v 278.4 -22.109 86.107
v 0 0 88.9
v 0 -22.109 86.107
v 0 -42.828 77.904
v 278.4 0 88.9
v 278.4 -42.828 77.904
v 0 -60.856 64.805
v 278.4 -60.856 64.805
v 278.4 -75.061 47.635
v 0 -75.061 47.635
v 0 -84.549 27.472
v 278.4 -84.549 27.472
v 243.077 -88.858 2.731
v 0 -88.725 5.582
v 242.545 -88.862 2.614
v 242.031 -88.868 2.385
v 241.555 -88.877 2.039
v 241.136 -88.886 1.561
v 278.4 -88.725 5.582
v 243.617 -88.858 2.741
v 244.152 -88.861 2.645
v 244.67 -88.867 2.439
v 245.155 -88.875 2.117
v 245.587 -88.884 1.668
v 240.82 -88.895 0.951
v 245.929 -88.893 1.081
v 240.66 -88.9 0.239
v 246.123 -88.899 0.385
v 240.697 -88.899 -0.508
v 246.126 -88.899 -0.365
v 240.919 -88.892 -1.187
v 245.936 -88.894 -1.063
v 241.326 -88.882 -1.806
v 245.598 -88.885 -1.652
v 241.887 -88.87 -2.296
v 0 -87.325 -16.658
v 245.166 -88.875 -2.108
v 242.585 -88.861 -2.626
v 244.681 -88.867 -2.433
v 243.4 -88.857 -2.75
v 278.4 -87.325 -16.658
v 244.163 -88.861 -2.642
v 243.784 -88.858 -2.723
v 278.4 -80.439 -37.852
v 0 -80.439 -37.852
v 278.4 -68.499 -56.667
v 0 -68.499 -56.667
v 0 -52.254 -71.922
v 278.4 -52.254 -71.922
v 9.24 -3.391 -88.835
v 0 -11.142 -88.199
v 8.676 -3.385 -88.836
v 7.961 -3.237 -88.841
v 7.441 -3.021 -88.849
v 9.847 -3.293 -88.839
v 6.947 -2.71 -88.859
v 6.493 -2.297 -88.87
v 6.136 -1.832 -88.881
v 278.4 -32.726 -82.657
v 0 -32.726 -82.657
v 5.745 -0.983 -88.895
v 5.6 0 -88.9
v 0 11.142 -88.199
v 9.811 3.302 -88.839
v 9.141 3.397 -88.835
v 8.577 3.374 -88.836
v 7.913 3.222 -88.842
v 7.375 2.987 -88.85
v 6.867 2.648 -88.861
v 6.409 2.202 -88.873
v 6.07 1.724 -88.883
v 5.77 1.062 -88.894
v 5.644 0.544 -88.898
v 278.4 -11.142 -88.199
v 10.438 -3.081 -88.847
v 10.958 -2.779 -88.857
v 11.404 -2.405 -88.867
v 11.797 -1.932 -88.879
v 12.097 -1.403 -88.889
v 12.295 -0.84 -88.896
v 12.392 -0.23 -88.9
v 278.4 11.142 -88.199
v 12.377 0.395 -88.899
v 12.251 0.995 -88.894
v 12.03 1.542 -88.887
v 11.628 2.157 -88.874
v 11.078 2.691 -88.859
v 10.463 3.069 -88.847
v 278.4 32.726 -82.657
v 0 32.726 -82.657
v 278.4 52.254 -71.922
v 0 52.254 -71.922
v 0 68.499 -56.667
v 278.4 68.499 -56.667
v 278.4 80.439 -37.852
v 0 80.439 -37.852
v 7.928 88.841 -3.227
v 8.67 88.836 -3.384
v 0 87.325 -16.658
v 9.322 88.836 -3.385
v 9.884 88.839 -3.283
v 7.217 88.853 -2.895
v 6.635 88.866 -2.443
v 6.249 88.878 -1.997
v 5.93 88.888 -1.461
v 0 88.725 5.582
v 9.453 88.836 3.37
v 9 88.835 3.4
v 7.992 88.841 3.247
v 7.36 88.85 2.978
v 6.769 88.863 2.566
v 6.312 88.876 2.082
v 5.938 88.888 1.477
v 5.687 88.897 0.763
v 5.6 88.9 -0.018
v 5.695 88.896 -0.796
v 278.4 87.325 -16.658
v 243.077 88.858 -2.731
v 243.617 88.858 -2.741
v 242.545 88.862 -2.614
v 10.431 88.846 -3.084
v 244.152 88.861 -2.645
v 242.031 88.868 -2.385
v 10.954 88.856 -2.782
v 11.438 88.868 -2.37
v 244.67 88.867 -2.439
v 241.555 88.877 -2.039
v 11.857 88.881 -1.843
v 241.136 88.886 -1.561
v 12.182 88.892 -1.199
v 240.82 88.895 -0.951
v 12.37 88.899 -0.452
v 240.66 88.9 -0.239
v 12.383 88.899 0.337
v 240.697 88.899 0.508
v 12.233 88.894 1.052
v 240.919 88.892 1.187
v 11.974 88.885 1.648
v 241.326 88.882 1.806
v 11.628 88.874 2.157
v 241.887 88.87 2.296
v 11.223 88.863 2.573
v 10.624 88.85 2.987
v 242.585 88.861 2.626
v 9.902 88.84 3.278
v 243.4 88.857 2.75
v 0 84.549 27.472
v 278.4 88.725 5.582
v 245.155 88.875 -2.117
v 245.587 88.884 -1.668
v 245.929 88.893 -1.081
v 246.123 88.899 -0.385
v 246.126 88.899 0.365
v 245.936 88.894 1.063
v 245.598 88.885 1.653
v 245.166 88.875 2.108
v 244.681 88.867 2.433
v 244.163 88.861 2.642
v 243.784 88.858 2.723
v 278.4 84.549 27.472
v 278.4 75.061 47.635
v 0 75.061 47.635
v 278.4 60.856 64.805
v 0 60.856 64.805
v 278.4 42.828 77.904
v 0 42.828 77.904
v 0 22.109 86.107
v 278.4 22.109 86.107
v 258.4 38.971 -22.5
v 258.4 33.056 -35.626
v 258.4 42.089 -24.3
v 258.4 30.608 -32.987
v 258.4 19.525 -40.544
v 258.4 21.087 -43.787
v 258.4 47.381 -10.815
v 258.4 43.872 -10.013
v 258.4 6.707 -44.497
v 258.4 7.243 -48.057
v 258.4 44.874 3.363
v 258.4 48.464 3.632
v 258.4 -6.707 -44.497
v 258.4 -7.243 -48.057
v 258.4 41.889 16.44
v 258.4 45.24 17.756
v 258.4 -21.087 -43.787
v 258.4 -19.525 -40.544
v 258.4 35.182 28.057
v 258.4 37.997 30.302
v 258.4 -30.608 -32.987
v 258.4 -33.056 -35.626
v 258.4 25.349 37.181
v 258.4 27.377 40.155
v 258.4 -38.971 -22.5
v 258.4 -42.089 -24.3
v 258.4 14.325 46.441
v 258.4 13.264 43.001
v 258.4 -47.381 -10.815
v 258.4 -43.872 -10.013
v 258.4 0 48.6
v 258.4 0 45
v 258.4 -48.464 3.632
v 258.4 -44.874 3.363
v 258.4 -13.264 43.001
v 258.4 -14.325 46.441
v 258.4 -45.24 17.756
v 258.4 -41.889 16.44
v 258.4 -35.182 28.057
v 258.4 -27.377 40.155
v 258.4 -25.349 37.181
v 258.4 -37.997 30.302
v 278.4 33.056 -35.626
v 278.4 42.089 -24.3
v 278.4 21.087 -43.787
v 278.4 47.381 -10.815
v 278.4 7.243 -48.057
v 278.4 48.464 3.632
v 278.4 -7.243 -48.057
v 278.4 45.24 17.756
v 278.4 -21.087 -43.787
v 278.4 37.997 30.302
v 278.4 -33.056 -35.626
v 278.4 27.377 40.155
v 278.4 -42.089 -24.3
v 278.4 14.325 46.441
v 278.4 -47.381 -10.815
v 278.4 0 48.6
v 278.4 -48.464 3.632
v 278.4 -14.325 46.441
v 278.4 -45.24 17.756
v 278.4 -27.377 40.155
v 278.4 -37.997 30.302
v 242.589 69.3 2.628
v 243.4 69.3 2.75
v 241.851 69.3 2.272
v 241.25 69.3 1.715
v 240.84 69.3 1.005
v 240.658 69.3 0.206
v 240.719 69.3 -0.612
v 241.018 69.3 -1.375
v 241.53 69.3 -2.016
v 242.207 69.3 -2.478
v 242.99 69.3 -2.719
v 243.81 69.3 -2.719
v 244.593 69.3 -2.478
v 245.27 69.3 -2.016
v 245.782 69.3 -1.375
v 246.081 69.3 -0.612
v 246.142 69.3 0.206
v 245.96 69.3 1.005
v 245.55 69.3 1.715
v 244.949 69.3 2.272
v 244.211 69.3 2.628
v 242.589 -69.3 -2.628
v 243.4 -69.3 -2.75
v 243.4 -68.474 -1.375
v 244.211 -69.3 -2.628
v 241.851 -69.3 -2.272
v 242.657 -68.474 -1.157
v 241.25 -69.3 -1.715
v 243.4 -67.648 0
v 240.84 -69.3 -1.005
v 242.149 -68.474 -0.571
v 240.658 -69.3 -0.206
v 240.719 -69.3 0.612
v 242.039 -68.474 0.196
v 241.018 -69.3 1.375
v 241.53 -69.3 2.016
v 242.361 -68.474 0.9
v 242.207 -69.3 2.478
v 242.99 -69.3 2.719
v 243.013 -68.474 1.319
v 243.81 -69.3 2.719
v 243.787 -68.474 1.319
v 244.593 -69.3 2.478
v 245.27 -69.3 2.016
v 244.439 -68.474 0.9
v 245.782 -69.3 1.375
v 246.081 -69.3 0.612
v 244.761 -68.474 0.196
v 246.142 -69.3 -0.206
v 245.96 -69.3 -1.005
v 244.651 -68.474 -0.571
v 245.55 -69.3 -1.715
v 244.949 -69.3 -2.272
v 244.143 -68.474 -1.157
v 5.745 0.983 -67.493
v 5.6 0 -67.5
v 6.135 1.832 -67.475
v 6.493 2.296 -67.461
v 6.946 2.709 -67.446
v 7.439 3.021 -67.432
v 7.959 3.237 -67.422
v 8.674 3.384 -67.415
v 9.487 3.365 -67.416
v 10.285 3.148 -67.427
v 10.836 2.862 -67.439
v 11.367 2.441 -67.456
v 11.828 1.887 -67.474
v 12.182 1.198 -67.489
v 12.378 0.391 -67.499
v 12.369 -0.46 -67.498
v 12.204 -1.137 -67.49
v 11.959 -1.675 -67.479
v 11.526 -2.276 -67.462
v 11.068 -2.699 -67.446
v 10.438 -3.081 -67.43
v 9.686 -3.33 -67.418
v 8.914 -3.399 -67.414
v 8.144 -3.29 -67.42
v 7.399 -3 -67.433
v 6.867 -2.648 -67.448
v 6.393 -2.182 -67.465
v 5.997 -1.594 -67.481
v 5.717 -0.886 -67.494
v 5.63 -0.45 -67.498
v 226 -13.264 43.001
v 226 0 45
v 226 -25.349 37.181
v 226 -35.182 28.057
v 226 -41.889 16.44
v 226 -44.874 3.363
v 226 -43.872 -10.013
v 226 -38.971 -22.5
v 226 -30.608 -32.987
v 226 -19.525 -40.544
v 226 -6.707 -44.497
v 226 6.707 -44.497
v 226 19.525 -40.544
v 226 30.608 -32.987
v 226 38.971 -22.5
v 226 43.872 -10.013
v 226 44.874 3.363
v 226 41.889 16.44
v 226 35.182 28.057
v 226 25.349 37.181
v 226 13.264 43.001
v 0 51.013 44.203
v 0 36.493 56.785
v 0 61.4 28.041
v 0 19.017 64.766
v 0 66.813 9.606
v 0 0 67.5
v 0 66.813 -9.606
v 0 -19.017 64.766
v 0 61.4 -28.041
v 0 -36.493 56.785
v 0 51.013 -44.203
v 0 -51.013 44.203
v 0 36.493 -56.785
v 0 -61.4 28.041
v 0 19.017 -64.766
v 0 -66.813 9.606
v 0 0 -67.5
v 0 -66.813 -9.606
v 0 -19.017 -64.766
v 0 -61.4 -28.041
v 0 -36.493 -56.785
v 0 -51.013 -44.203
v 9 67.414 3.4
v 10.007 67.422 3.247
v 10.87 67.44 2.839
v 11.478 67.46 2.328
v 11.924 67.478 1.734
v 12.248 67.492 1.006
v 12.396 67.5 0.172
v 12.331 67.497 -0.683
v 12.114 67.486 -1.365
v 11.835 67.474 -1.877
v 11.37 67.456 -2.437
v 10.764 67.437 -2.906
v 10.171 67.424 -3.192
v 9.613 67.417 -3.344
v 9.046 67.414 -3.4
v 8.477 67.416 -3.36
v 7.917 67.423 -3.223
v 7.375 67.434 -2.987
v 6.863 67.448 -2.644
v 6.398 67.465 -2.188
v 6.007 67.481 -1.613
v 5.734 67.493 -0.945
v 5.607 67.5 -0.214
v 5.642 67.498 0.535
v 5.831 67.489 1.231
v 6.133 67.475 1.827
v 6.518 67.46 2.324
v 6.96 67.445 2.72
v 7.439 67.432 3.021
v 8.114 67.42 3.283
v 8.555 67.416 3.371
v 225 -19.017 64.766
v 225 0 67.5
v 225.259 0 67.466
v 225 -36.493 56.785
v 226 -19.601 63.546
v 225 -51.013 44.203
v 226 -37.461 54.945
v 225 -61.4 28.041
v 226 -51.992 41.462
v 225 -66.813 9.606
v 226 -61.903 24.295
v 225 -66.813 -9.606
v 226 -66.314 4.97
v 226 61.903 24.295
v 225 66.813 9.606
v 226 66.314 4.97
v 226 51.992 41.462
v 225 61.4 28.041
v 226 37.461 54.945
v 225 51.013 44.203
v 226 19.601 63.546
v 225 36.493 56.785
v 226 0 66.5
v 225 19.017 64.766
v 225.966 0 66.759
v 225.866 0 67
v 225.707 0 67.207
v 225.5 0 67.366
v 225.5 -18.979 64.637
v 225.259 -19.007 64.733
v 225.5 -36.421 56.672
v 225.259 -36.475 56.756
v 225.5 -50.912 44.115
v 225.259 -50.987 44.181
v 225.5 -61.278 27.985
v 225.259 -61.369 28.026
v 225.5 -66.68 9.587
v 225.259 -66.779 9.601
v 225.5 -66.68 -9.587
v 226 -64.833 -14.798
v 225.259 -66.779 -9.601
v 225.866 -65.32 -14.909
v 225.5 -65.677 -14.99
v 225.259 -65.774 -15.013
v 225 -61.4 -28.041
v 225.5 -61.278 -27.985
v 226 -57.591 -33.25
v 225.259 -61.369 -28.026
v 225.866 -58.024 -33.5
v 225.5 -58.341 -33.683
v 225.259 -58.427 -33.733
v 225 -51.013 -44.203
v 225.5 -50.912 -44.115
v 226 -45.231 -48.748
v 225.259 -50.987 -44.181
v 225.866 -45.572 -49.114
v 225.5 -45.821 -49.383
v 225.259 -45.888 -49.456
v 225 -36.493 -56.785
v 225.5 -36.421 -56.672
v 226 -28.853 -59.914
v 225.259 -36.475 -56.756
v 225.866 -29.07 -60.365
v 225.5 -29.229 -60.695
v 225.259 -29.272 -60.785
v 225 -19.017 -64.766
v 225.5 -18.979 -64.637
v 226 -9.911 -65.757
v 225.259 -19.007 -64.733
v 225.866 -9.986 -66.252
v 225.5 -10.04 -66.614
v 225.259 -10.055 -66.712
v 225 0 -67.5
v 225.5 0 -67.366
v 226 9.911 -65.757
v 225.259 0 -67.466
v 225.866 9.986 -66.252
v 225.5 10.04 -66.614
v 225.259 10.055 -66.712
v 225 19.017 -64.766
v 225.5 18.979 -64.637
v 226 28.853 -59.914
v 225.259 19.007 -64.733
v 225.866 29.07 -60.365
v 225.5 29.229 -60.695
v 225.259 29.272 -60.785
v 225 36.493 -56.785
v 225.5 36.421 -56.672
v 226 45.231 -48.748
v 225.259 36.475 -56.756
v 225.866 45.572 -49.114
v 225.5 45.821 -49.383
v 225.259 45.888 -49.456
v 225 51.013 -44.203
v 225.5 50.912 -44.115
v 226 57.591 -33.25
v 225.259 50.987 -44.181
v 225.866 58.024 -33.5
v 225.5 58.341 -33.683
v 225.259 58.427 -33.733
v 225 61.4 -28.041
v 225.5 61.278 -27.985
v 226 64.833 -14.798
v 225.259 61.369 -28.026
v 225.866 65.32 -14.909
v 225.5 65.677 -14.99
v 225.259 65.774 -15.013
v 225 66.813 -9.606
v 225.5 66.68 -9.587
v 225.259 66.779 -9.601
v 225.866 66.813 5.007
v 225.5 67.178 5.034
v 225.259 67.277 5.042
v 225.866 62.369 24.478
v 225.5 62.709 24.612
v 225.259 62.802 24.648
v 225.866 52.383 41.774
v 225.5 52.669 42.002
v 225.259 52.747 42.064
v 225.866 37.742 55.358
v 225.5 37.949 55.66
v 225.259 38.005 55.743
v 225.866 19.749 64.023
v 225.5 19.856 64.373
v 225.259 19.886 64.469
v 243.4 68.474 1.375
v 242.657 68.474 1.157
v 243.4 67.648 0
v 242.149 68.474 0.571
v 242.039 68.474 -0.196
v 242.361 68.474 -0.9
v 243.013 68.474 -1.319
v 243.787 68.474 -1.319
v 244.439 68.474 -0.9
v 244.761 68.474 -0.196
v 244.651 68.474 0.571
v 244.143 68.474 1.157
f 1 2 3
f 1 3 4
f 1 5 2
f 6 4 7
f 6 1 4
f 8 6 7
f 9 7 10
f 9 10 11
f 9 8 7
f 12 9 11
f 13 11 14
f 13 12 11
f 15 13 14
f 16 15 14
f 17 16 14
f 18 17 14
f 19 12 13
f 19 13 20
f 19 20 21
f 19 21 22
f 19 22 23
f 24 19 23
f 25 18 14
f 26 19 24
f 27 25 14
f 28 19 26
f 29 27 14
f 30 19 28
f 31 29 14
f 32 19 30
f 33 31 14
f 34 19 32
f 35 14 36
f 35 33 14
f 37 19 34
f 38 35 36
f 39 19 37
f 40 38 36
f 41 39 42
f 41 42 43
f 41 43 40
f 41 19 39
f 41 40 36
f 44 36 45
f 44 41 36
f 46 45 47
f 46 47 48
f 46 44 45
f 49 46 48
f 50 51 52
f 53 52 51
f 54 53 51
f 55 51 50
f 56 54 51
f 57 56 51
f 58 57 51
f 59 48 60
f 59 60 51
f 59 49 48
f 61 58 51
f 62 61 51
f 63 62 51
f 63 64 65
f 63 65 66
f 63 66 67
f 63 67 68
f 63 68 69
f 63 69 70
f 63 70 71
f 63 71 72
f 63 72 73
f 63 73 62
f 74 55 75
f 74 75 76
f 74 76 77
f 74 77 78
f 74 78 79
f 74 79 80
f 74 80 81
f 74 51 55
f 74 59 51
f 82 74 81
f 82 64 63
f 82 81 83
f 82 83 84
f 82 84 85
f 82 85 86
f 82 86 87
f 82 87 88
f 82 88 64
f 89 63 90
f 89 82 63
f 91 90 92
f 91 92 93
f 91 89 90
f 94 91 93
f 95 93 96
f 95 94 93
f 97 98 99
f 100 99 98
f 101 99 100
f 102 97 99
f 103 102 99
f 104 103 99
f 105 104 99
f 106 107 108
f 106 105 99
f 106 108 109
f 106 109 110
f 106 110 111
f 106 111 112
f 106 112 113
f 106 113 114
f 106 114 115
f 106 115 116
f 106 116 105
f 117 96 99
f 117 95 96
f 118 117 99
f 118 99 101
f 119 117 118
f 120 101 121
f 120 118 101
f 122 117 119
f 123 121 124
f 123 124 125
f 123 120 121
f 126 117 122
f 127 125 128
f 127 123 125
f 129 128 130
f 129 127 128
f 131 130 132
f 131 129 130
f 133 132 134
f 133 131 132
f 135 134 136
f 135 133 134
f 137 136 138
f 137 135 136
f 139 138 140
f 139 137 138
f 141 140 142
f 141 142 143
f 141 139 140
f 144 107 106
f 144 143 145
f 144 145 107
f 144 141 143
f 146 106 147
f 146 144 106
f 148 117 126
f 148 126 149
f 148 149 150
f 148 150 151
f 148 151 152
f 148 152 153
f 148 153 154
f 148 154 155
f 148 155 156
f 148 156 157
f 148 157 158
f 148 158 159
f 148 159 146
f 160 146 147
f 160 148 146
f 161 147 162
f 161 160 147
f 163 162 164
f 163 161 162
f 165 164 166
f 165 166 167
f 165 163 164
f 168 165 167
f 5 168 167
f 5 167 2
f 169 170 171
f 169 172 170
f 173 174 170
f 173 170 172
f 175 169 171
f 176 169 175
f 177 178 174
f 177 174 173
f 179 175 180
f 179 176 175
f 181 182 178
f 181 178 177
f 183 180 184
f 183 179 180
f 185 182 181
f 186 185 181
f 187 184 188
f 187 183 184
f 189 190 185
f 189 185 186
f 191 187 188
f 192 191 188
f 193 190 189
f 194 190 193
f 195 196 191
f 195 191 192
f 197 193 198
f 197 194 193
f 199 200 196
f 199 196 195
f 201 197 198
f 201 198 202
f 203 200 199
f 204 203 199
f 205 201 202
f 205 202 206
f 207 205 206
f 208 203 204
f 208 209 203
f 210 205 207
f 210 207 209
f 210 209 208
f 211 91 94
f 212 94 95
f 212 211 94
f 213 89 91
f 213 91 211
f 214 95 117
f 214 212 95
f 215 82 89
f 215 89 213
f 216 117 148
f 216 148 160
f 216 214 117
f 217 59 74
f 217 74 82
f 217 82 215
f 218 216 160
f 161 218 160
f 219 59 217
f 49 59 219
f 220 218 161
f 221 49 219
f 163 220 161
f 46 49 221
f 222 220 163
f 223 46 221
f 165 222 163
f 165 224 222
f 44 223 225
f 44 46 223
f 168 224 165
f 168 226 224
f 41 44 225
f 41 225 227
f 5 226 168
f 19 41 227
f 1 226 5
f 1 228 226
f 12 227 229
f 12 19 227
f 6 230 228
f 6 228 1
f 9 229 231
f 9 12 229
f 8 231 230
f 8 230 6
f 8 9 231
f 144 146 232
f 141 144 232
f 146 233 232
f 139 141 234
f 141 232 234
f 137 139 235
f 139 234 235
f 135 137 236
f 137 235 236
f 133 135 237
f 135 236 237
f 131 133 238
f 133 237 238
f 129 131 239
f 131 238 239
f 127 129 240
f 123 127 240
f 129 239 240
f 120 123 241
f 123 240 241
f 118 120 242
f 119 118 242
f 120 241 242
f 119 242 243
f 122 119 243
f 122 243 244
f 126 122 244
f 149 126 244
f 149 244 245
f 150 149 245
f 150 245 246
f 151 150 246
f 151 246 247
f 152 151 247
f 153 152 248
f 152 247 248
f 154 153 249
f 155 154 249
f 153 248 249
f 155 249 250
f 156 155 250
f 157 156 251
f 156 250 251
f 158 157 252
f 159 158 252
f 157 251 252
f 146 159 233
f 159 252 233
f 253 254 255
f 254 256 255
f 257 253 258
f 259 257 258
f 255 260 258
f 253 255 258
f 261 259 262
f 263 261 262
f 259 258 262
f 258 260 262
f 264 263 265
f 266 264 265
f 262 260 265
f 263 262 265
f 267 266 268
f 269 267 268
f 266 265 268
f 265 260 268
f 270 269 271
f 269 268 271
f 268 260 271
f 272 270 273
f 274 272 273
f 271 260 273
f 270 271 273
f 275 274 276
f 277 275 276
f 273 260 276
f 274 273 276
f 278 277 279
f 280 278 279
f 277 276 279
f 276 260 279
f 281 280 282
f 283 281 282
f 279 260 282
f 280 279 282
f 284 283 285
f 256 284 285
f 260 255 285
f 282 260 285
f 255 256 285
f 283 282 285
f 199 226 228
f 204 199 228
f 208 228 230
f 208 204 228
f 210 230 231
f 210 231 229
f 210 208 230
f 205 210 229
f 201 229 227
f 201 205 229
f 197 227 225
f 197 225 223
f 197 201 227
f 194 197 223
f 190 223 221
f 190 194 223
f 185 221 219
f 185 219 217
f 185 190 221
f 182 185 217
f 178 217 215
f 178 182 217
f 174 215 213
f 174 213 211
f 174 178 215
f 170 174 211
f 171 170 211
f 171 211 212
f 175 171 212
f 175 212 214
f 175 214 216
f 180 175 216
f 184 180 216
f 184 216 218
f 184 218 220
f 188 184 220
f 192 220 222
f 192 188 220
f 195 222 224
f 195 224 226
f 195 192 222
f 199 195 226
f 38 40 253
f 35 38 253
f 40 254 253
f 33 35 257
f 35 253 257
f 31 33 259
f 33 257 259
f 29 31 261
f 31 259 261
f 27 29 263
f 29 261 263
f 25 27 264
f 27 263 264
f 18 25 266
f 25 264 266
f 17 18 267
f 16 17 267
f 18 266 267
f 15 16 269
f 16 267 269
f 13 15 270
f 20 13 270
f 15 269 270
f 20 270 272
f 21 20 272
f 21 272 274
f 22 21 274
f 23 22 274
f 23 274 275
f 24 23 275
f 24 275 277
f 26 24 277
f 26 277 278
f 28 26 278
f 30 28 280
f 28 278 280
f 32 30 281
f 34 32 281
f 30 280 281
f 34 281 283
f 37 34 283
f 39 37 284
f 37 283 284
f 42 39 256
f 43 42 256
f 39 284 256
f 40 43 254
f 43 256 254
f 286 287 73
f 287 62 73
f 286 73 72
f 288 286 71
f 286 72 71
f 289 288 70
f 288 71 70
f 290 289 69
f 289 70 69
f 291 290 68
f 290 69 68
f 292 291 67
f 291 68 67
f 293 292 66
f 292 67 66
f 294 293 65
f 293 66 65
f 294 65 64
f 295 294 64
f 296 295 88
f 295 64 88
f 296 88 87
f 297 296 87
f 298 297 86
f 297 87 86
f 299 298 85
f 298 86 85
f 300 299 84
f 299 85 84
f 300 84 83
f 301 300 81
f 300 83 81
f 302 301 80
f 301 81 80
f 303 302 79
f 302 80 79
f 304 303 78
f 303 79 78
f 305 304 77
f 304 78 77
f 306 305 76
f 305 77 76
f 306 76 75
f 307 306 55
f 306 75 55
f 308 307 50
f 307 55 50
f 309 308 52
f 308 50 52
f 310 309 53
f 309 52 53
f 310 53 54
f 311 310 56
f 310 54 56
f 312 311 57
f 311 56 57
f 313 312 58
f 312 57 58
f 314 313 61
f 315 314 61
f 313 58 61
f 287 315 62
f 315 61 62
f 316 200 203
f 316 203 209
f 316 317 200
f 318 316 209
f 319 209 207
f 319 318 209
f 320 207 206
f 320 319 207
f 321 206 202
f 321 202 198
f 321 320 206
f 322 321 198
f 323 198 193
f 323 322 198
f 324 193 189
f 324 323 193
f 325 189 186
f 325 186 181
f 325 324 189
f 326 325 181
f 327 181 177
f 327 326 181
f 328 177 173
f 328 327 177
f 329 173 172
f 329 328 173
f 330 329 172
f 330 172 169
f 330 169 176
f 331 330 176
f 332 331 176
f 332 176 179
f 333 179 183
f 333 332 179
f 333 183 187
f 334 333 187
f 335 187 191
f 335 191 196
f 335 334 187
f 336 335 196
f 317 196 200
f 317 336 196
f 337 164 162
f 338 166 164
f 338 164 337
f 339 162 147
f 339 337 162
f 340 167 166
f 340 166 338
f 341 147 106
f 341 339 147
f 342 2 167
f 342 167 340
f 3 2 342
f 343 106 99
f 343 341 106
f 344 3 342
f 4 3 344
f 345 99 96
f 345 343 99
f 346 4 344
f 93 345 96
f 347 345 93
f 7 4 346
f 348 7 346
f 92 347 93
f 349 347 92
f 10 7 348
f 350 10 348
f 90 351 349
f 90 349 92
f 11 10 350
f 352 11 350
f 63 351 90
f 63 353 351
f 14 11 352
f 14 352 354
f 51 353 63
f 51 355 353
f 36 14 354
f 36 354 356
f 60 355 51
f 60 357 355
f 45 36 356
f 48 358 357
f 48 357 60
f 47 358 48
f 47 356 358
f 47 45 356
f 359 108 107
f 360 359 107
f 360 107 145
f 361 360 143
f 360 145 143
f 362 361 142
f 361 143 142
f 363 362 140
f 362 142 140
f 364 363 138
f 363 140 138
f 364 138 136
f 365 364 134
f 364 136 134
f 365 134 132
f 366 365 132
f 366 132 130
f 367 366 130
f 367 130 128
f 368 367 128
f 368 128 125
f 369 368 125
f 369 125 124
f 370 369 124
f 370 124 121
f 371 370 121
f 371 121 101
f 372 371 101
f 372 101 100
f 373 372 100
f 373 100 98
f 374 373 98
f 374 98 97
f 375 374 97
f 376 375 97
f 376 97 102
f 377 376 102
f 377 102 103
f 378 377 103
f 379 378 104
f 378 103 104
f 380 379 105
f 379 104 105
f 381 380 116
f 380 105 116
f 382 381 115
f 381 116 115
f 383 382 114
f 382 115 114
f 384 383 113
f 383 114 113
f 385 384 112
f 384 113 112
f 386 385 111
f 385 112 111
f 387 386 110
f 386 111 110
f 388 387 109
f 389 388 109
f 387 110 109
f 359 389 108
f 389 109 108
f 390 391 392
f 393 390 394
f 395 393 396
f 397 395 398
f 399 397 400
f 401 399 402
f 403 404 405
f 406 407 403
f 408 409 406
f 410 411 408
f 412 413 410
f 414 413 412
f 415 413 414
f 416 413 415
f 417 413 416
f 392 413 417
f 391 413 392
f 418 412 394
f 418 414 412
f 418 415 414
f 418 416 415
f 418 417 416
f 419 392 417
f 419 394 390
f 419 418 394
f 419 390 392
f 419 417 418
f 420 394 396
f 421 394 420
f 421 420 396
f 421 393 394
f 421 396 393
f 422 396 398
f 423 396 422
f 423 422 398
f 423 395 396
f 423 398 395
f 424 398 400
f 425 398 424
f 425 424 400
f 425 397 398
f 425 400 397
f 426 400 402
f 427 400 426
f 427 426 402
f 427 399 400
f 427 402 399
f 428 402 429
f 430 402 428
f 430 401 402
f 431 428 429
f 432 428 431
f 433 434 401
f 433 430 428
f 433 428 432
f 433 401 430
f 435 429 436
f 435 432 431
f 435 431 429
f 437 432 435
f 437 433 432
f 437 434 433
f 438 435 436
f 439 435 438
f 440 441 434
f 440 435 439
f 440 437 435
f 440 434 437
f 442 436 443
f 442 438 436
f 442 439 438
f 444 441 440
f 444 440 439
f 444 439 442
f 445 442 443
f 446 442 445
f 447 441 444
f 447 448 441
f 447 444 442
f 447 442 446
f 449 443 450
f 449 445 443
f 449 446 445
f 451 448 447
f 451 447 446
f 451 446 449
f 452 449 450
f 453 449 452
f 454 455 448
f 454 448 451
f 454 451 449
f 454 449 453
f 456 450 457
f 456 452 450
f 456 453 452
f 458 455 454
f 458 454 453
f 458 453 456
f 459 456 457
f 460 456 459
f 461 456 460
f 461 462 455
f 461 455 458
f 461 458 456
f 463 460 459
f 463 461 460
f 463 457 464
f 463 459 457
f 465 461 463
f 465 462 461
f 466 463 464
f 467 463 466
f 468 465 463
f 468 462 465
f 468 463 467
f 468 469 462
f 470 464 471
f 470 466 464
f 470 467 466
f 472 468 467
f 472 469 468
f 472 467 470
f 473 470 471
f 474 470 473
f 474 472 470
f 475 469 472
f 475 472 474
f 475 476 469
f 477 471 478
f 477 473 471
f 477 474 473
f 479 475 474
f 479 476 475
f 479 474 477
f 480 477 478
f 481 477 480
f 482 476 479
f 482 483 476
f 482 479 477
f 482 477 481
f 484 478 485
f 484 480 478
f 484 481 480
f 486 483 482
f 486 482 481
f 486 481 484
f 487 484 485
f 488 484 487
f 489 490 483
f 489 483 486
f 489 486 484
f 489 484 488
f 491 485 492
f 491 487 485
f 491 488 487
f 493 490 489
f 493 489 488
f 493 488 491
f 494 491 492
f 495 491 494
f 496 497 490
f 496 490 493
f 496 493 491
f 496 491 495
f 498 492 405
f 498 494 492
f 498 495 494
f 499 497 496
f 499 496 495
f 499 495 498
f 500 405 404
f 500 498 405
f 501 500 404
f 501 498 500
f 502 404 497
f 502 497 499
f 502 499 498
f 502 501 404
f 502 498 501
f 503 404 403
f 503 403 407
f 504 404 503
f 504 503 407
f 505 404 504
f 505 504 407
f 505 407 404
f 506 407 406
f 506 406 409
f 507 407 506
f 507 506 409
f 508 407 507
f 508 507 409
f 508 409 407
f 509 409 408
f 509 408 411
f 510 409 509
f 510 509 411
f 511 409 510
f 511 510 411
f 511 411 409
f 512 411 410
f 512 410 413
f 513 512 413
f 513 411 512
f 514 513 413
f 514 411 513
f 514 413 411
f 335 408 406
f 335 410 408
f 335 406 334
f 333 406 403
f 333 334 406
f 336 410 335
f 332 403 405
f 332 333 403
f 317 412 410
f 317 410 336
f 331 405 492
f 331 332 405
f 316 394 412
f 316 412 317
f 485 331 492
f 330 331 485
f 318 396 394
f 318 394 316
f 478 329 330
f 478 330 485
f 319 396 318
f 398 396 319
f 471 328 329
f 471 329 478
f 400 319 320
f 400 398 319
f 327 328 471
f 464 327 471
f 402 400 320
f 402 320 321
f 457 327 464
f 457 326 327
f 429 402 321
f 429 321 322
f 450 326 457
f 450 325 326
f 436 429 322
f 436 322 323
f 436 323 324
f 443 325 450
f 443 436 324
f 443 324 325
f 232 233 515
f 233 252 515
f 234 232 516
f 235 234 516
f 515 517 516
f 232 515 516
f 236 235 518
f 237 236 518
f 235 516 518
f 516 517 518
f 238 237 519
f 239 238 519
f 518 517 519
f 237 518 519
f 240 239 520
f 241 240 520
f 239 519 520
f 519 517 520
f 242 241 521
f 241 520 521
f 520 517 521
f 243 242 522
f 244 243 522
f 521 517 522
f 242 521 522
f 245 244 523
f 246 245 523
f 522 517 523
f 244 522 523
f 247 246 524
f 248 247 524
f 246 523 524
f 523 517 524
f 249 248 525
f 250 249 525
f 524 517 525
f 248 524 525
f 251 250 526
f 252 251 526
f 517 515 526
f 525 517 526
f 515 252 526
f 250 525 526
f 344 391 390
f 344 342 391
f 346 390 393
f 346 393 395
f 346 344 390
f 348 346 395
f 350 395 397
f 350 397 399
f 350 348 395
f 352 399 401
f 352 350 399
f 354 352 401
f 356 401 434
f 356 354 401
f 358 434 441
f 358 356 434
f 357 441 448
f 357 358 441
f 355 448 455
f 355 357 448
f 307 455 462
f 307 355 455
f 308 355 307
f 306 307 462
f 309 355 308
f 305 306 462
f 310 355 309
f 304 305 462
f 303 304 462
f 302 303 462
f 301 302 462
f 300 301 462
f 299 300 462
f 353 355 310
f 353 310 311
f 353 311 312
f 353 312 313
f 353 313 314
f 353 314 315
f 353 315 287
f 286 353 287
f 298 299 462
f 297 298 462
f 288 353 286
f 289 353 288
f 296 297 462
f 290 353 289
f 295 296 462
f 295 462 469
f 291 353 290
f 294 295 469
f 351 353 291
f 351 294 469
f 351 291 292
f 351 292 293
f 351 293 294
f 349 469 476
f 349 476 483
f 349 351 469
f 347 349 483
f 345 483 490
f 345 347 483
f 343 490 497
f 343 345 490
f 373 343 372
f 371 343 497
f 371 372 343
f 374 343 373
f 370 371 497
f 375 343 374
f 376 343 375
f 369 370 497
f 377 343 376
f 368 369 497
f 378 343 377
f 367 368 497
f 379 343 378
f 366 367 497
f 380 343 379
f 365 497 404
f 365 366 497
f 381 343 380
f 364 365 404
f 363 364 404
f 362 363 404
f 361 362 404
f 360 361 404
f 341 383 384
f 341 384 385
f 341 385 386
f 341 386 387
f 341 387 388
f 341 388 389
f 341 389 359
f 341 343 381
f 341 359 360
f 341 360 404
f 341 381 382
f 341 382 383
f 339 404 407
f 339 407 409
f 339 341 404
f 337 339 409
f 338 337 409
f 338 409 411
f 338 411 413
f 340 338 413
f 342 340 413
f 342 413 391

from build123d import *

# Parameters (mm, degrees)
KREISMUSTER1_COUNT                 = 2
M8_GEWINDEBOHRUNG1_REACH           = 179.8
M8_GEWINDEBOHRUNG1_BORE_R          = 3.4
M8_GEWINDEBOHRUNG1_ON_FACE_2_REACH = 179.8
M8_GEWINDEBOHRUNG1_BORE_2_R        = 3.4


with BuildPart() as part:
    # Skizze1 → Rotation1 (revolve)
    with BuildSketch(Plane.XY, mode=Mode.PRIVATE) as rotation1_sk:
        with BuildLine():
            Line((0, 88.9), (278.4, 88.9))
            Line((278.4, 88.9), (278.4, 48.6))
            Line((278.4, 48.6), (258.4, 48.6))
            Line((258.4, 48.6), (258.4, 45))
            Line((258.4, 45), (226, 45))
            Line((226, 45), (226, 66.5))
            ThreePointArc((226, 66.5), (225.707106781, 67.207106781), (225, 67.5))
            Line((225, 67.5), (0, 67.5))
            Line((0, 67.5), (0, 88.9))
        make_face()
    revolve(rotation1_sk.sketch.rotate(Axis((0, 0, 0), (1, 0, 0)), 90), axis=Axis((0, 0, 0), (1, 0, 0)))  # turned: the seam where the file's is

    # Skizze6 → Schnitt-Rotation1 (revolve, cut)
    with BuildSketch(Plane.XY, mode=Mode.PRIVATE) as schnitt_rotation1_sk:
        Polygon((243.4, 88.9), (246.15, 88.9), (246.15, 69.3), (243.4, 67.647633298), align=None)
    schnitt_rotation1 = revolve(schnitt_rotation1_sk.sketch.rotate(Axis((243.4, 88.9, 0), (0, -1, 0)), 90), axis=Axis((243.4, 88.9, 0), (0, -1, 0)), mode=Mode.SUBTRACT)  # turned: the seam where the file's is

    # Kreismuster1: Schnitt-Rotation1 ×2 about axis
    kreismuster1_axis = Axis((0, 0, 0), (-1, 0, 0))
    for i in range(1, KREISMUSTER1_COUNT):
        add(schnitt_rotation1.rotate(kreismuster1_axis, i * 360 / KREISMUSTER1_COUNT), mode=Mode.SUBTRACT)

    # M8 Gewindebohrung1 bore (on position points) → M8 Gewindebohrung1 (cut, up to next)
    with BuildSketch(Plane(origin=(9, 88.9, 0), x_dir=(0, 0, 1), z_dir=(0, 1, 0)), mode=Mode.PRIVATE) as m8_gewindebohrung1_sk1:
        Circle(M8_GEWINDEBOHRUNG1_BORE_R)
    m8_gewindebohrung1_tool1 = extrude(m8_gewindebohrung1_sk1.sketch, amount=-M8_GEWINDEBOHRUNG1_REACH, mode=Mode.PRIVATE) & part.part
    add(m8_gewindebohrung1_tool1.solids().sort_by_distance((9, 88.9, 0))[0], mode=Mode.SUBTRACT)

    # M8 Gewindebohrung1 bore 2 (on position points) → M8 Gewindebohrung1 on face 2 (cut, up to next)
    with BuildSketch(Plane(origin=(9, 0, -88.9), x_dir=(-1, 0, 0), z_dir=(0, 0, -1)), mode=Mode.PRIVATE) as m8_gewindebohrung1_on_face_2_sk1:
        Circle(M8_GEWINDEBOHRUNG1_BORE_2_R)
    m8_gewindebohrung1_on_face_2_tool1 = extrude(m8_gewindebohrung1_on_face_2_sk1.sketch, amount=-M8_GEWINDEBOHRUNG1_ON_FACE_2_REACH, mode=Mode.PRIVATE) & part.part
    add(m8_gewindebohrung1_on_face_2_tool1.solids().sort_by_distance((9, 0, -88.9))[0], mode=Mode.SUBTRACT)


solid = part.part
